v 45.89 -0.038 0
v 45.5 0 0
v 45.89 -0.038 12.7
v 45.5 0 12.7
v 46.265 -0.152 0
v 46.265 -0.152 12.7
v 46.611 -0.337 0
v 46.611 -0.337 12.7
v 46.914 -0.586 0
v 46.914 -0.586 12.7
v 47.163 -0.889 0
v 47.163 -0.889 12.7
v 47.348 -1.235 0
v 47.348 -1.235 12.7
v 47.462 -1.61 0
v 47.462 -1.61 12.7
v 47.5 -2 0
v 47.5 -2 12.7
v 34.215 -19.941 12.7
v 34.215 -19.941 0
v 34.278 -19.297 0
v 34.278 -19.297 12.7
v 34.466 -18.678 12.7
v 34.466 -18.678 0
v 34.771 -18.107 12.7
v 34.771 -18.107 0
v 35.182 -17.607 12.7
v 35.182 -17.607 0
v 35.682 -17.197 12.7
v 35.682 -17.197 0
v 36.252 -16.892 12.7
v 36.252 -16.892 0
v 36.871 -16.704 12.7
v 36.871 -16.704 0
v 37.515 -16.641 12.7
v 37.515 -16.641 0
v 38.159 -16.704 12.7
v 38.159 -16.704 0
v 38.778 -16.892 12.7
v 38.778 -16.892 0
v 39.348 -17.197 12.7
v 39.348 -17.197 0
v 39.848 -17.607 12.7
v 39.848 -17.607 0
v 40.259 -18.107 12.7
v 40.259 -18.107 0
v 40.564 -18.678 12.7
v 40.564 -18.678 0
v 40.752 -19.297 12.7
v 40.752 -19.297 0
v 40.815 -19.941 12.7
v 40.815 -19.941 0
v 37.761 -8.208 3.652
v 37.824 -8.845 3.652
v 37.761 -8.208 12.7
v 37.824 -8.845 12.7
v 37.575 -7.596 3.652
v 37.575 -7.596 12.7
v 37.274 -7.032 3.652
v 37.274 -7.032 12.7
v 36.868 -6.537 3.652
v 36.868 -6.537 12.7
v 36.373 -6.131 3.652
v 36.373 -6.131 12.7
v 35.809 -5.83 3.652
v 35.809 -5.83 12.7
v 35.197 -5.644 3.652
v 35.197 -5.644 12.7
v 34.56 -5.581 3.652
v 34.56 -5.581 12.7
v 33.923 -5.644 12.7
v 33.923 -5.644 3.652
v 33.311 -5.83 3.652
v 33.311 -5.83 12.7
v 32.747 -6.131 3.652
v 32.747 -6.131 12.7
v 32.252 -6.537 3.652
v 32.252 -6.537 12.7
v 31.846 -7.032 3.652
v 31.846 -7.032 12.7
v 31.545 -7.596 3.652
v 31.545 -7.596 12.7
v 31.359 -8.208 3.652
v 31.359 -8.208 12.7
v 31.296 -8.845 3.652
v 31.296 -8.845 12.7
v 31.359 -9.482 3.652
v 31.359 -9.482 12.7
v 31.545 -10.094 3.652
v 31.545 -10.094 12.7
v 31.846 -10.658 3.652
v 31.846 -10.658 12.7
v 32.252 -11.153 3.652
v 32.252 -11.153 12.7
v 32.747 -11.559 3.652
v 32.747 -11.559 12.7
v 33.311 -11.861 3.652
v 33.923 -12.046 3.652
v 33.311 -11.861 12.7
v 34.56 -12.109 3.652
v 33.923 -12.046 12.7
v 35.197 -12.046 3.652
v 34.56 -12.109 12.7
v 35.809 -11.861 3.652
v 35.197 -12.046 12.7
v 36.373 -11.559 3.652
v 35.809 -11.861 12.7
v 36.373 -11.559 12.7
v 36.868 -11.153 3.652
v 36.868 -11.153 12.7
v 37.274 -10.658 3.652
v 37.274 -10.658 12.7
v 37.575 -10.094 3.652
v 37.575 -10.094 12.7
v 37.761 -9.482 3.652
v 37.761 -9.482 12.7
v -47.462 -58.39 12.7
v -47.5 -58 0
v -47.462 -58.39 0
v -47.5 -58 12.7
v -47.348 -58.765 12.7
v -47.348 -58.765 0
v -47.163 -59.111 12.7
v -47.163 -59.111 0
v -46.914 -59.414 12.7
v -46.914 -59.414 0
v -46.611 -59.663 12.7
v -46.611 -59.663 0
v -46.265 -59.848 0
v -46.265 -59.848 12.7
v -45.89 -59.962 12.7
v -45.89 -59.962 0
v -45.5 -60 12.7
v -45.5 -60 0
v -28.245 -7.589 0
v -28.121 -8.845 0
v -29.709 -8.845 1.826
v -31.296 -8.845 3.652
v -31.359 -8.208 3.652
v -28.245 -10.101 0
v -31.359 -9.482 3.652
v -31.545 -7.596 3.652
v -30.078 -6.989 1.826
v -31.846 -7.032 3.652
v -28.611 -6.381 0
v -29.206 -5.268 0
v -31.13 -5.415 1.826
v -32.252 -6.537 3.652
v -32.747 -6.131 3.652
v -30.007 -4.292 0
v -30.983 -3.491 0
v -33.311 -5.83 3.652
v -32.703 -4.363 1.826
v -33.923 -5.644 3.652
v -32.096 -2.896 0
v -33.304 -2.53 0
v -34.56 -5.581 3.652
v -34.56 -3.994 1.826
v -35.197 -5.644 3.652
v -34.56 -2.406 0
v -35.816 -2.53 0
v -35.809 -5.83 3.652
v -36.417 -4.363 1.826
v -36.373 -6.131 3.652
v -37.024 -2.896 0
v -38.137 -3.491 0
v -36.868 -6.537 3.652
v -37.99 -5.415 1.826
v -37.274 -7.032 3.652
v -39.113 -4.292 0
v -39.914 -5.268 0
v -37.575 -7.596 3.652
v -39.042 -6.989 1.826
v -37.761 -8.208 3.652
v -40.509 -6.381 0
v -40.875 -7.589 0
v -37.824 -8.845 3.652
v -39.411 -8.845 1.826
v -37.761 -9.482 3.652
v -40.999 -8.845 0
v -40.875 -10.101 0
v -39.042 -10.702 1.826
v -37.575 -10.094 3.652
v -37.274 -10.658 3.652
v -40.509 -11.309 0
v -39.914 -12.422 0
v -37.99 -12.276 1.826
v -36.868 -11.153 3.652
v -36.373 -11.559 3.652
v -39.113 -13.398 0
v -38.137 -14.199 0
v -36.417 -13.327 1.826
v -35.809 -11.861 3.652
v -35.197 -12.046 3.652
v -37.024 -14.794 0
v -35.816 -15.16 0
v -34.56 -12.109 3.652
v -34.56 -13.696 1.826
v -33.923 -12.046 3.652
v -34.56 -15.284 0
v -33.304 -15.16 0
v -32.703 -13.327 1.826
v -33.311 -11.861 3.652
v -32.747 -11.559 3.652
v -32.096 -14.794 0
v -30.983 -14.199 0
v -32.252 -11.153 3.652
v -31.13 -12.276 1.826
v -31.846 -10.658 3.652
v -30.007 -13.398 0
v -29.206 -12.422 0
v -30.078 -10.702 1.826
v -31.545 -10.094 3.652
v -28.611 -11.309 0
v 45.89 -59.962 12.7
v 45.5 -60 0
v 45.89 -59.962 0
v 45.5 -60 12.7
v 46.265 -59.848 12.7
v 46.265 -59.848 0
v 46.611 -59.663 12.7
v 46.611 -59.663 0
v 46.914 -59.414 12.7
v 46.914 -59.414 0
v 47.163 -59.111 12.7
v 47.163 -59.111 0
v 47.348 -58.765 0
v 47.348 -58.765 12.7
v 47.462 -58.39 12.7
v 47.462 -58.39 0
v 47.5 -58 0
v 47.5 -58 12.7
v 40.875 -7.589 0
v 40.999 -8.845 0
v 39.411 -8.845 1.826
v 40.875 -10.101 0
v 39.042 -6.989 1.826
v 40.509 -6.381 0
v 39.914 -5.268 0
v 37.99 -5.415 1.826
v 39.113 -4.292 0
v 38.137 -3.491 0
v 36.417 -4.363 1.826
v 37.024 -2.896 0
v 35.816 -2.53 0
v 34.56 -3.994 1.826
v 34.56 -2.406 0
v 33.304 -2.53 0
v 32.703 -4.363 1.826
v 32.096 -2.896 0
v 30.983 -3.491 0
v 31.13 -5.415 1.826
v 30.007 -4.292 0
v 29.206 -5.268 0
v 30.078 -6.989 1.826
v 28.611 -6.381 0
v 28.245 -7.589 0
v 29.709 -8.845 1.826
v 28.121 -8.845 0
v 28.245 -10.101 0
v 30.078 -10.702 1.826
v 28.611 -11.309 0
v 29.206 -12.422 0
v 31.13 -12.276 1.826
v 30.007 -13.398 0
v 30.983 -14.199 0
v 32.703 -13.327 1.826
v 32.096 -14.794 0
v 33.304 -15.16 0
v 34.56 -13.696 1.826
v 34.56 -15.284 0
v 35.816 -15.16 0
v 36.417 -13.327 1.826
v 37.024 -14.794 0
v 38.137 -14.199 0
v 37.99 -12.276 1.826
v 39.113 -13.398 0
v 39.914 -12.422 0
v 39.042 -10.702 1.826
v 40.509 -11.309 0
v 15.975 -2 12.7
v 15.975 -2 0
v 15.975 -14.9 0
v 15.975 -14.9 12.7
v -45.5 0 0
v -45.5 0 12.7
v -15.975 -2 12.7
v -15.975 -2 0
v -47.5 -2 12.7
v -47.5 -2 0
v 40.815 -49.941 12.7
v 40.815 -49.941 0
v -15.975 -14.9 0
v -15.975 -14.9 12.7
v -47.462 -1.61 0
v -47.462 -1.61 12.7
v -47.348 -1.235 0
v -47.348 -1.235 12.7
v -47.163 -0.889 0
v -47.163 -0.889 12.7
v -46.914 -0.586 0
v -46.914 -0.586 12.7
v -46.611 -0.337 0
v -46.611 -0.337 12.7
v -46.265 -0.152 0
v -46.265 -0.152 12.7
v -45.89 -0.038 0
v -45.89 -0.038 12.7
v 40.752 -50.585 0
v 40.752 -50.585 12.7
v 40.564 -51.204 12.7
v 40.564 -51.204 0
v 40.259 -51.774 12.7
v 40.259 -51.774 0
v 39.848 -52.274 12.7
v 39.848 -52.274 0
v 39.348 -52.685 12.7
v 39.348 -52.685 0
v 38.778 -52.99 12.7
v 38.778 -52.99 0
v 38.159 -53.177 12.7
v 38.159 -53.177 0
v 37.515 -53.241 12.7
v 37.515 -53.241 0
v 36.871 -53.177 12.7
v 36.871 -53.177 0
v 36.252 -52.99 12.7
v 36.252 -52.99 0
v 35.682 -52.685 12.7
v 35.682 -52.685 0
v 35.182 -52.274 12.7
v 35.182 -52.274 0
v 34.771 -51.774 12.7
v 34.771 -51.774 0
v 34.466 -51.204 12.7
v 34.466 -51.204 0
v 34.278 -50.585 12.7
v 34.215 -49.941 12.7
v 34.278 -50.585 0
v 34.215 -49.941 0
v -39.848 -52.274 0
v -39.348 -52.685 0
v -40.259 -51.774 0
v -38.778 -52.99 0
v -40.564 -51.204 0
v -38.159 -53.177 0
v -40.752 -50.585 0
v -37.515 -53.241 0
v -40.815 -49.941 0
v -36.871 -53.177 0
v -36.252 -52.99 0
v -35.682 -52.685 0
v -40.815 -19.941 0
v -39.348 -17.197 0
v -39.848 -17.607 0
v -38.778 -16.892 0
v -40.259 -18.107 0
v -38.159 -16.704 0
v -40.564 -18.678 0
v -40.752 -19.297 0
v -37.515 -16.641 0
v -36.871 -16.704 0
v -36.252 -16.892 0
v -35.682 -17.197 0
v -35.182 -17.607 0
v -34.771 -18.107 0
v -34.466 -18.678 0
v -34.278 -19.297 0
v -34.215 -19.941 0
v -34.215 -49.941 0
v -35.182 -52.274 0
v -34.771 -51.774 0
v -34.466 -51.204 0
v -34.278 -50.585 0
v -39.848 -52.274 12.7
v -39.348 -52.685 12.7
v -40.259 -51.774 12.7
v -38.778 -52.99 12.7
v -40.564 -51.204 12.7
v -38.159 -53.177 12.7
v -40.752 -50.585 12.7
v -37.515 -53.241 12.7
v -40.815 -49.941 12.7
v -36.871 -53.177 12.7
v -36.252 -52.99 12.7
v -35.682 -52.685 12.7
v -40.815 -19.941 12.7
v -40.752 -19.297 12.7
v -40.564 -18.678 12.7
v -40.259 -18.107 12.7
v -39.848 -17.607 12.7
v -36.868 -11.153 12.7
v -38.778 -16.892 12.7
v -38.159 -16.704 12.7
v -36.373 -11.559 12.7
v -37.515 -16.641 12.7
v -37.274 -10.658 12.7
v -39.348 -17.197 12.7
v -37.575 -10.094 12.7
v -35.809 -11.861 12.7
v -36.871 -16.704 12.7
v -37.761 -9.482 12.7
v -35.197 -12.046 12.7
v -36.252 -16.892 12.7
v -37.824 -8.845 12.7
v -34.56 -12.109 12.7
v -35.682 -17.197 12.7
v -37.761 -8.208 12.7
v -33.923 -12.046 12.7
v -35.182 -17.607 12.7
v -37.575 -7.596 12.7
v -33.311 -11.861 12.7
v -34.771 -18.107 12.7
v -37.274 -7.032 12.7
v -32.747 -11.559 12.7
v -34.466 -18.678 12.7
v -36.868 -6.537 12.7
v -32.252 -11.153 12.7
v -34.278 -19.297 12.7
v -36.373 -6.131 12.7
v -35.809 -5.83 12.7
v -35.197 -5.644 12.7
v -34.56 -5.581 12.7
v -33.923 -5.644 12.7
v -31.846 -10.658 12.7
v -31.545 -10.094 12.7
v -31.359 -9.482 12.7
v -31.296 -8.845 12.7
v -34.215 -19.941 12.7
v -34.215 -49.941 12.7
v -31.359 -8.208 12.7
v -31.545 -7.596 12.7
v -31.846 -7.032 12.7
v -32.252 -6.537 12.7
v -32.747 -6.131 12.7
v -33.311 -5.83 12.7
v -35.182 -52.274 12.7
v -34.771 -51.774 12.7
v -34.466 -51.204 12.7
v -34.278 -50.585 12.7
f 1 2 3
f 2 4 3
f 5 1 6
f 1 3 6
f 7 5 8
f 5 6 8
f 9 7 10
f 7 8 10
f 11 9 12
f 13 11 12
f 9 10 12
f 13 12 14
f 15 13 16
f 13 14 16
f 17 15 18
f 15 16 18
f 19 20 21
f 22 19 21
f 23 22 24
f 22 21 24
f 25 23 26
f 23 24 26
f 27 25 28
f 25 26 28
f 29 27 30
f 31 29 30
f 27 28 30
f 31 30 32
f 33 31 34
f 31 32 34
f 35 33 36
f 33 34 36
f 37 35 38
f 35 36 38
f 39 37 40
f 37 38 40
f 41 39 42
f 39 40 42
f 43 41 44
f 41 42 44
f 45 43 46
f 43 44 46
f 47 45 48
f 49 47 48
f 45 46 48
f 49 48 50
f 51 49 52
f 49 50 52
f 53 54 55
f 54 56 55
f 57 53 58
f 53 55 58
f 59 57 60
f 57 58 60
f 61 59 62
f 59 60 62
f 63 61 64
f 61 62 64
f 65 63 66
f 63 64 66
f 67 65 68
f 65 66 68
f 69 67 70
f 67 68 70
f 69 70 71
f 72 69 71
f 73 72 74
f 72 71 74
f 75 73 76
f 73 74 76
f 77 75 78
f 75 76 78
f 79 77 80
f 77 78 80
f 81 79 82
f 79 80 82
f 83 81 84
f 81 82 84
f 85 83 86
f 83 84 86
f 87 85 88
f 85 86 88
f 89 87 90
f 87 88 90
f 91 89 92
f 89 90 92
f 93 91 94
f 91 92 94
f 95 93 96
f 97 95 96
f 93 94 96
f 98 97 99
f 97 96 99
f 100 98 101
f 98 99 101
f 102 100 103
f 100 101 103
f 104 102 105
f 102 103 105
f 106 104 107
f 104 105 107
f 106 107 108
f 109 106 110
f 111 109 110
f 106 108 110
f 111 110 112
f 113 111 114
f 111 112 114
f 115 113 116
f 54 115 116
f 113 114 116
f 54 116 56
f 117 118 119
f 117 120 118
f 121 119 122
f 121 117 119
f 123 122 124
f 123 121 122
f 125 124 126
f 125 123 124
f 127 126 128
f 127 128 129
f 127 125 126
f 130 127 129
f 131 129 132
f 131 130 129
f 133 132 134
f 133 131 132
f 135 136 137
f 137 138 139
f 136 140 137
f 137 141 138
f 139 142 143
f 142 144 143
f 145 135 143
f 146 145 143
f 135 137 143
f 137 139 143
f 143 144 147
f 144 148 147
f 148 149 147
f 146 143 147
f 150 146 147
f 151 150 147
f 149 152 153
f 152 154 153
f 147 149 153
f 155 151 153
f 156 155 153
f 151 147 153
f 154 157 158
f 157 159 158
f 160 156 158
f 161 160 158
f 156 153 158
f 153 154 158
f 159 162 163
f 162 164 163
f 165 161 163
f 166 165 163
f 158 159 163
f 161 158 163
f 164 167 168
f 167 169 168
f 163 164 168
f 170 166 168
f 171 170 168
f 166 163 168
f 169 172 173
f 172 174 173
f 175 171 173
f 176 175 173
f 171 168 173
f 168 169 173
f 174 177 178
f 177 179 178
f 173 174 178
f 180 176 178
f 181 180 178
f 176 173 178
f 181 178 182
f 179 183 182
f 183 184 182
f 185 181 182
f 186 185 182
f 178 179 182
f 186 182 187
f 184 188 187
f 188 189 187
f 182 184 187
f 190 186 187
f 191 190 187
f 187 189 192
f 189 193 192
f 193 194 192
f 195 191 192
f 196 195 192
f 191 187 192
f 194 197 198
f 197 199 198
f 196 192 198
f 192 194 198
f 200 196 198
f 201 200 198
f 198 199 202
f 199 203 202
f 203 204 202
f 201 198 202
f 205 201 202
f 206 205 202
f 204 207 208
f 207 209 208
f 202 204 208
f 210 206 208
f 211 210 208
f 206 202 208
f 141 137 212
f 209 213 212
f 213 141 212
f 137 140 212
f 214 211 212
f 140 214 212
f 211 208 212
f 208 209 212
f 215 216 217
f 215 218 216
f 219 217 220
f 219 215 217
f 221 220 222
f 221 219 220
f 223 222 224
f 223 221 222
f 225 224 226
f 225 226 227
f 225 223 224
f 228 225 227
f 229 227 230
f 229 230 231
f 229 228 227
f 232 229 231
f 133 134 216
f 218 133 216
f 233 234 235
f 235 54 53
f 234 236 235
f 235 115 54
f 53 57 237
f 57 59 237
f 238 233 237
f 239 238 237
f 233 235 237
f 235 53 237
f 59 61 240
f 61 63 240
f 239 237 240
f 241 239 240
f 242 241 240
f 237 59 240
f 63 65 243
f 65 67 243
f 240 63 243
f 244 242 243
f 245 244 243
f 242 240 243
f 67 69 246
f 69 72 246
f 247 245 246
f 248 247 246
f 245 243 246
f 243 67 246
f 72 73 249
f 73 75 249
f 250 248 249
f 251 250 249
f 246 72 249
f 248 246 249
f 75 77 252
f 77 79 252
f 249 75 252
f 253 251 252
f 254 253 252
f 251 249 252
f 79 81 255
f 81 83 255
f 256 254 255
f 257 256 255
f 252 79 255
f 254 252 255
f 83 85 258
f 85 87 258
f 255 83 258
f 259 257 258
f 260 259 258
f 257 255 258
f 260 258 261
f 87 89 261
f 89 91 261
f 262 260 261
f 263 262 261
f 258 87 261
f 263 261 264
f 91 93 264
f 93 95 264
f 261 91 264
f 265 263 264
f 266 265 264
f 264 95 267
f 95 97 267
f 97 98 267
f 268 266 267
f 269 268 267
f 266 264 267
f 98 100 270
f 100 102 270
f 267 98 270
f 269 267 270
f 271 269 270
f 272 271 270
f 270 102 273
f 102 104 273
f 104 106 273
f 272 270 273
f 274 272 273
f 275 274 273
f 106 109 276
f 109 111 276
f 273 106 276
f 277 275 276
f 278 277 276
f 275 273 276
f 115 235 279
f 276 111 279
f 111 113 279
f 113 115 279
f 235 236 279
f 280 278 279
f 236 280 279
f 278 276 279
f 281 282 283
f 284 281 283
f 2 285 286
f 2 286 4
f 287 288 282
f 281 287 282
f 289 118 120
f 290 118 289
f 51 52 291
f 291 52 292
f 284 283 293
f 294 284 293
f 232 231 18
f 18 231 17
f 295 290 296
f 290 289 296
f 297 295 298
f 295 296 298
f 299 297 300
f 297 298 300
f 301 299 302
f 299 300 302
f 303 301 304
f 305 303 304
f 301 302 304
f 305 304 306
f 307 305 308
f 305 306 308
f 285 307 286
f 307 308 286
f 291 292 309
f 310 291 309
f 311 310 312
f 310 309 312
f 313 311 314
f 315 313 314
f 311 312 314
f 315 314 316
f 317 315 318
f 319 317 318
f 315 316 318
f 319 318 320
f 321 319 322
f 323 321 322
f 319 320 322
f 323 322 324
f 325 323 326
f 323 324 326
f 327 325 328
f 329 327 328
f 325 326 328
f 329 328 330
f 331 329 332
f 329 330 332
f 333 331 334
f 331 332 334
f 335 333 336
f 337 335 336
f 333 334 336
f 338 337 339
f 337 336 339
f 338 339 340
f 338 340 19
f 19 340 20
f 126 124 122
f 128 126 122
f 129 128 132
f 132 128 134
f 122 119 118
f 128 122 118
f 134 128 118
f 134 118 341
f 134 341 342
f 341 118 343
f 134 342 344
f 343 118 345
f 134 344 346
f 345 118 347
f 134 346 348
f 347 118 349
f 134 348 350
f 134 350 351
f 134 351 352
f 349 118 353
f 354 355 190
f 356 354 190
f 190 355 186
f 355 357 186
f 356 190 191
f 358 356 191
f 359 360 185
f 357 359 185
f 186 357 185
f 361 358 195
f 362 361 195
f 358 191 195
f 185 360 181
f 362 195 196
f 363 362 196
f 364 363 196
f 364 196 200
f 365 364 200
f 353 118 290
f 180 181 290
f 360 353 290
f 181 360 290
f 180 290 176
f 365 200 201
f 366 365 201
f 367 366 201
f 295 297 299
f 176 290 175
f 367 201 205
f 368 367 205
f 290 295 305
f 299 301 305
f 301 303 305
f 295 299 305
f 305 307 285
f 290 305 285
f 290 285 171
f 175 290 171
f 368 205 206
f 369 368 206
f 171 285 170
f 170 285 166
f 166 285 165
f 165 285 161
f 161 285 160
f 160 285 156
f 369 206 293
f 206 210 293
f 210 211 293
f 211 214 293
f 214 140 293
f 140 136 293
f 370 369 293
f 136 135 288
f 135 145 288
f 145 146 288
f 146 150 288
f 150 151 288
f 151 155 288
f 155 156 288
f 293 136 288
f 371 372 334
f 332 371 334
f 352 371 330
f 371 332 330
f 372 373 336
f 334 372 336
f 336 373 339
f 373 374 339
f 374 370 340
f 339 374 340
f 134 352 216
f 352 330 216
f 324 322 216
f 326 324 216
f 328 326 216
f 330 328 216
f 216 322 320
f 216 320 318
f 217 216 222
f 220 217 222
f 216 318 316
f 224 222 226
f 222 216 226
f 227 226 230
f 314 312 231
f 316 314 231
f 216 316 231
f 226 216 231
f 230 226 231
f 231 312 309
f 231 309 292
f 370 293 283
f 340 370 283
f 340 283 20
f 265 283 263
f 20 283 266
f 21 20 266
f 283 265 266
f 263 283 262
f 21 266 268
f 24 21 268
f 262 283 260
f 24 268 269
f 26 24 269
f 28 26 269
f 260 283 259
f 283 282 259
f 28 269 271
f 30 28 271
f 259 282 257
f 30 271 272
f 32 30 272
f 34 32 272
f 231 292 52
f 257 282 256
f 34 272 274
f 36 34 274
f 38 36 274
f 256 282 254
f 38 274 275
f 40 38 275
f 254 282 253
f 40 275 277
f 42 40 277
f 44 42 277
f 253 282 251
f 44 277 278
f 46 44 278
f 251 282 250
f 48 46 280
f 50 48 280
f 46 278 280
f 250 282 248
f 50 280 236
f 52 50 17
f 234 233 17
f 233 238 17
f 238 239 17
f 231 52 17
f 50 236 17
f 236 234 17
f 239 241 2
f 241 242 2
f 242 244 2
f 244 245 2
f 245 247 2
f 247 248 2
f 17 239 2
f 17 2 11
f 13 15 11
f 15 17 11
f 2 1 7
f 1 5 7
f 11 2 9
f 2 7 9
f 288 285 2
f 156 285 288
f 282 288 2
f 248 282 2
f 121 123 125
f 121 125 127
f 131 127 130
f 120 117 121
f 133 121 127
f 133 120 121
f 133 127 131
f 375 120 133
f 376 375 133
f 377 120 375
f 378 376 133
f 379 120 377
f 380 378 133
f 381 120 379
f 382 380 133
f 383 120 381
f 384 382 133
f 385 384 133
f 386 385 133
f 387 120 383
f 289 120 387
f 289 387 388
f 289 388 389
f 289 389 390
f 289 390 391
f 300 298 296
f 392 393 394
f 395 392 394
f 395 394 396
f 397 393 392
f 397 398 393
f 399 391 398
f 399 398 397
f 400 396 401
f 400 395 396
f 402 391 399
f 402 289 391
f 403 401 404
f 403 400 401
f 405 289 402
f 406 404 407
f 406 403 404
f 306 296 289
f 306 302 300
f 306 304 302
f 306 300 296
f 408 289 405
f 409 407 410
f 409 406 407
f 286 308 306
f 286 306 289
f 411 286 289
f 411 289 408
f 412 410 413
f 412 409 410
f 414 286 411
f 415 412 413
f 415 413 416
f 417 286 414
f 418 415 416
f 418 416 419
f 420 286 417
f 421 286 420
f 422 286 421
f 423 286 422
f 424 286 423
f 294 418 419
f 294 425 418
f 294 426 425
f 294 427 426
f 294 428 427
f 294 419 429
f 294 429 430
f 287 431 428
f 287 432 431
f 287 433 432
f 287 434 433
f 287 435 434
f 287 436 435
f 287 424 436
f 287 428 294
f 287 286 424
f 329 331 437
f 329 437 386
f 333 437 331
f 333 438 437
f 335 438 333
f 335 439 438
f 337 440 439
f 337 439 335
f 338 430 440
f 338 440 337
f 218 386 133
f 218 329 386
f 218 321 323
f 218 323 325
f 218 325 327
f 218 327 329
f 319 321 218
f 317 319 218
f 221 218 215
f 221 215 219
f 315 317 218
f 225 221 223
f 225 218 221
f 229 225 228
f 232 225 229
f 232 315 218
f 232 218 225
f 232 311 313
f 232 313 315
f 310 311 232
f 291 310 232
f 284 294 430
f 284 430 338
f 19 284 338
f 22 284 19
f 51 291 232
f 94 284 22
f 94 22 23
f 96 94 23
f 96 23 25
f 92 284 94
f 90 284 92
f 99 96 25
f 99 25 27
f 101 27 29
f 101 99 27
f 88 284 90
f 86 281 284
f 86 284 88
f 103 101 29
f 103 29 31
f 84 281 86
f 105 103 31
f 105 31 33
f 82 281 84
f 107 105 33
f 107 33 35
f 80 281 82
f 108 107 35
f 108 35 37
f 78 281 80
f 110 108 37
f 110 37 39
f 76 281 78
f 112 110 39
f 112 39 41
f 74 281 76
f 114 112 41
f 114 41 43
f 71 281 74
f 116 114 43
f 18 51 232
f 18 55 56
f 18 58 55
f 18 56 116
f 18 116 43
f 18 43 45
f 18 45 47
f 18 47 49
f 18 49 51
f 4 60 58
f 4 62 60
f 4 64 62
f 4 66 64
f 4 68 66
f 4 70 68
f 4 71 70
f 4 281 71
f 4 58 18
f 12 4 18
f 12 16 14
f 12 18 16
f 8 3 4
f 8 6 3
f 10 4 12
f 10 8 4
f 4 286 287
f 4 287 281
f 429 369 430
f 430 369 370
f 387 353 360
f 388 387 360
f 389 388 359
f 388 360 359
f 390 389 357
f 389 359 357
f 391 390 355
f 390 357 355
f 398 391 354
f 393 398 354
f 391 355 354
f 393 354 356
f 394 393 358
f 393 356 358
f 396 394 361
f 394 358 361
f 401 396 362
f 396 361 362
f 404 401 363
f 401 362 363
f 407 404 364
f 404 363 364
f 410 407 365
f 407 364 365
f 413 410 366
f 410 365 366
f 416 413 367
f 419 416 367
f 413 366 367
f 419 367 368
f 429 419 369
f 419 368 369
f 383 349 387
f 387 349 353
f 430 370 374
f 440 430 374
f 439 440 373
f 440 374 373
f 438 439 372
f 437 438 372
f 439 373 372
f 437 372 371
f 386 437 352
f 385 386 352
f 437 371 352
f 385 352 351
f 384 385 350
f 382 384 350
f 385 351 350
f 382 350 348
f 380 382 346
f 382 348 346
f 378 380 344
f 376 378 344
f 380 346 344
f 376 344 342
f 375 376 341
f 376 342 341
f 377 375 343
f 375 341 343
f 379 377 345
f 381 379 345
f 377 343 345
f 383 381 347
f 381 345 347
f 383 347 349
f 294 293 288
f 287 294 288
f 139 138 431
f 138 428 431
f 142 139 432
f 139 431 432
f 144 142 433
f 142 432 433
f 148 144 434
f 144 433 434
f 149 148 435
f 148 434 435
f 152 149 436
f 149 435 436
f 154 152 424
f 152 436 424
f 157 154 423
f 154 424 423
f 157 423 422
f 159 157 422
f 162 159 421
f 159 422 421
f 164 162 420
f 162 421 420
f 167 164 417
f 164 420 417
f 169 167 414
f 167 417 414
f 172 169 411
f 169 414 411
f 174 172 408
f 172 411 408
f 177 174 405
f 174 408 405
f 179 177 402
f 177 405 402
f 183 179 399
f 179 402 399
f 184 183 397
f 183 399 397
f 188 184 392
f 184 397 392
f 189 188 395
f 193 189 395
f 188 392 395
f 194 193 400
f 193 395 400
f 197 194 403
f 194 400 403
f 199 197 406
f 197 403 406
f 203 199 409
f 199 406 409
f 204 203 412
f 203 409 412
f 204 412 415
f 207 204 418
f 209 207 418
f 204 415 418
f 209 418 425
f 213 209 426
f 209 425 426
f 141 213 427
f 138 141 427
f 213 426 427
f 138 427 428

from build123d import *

# Parameters (mm, degrees)
SKETCH1_W                                        = 95
SKETCH1_H                                        = 60
BOSS_EXTRUDE1_DEPTH                              = 12.7
CSK_FOR_1_4_FLAT_HEAD_MACHINE_SCREW2_D           = 6.5278
CSK_FOR_1_4_FLAT_HEAD_MACHINE_SCREW2_CSINK_D     = 12.8778
CSK_FOR_1_4_FLAT_HEAD_MACHINE_SCREW2_CSINK_ANGLE = 82
FILLET1_R                                        = 2
FILLET2_R                                        = 2
CUT_EXTRUDE1_DEPTH                               = 78.572804513


with BuildPart() as part:
    # Sketch1 → Boss-Extrude1 (new body)
    with BuildSketch(Plane.XY):
        with Locations((0, -30)):
            Rectangle(SKETCH1_W, SKETCH1_H)
        Polygon((0, -2), (15.975, -2), (15.975, -14.9), (-15.975, -14.9), (-15.975, -2), align=None, mode=Mode.SUBTRACT)
    extrude(amount=BOSS_EXTRUDE1_DEPTH)

    # CSK for 1/4 Flat Head Machine Screw2 (through all)
    with Locations(Plane(origin=(0, 0, 0), x_dir=(-1, 0, 0), z_dir=(0, 0, -1))):
        with Locations((-34.56, -8.845086615), (34.56, -8.845086615)):
            CounterSinkHole(CSK_FOR_1_4_FLAT_HEAD_MACHINE_SCREW2_D / 2, CSK_FOR_1_4_FLAT_HEAD_MACHINE_SCREW2_CSINK_D / 2, counter_sink_angle=CSK_FOR_1_4_FLAT_HEAD_MACHINE_SCREW2_CSINK_ANGLE)

    # Fillet1
    fillet1_edges = [part.edges().sort_by_distance(p)[0] for p in [
        (-47.5, 0, 6.35),
        (-47.5, -60, 6.35),
    ]]
    fillet(fillet1_edges, radius=FILLET1_R)

    # Fillet2
    fillet2_edges = [part.edges().sort_by_distance(p)[0] for p in [
        (47.5, 0, 6.35),
        (47.5, -60, 6.35),
    ]]
    fillet(fillet2_edges, radius=FILLET2_R)

    # Sketch9 → Cut-Extrude1 (cut, through all)
    with BuildSketch(Plane(origin=(0, 0, 0), x_dir=(-1, 0, 0), z_dir=(0, 0, -1))):
        with BuildLine():
            Line((-34.215, -49.94085979), (-34.215, -19.94085979))
            ThreePointArc((-34.215, -19.94085979), (-37.515, -16.64085979), (-40.815, -19.94085979))
            Line((-40.815, -19.94085979), (-40.815, -49.94085979))
            ThreePointArc((-40.815, -49.94085979), (-37.515, -53.24085979), (-34.215, -49.94085979))
        make_face()
        with BuildLine():
            Line((40.815, -49.94085979), (40.815, -19.94085979))
            ThreePointArc((40.815, -19.94085979), (37.515, -16.64085979), (34.215, -19.94085979))
            Line((34.215, -19.94085979), (34.215, -49.94085979))
            ThreePointArc((34.215, -49.94085979), (37.515, -53.24085979), (40.815, -49.94085979))
        make_face()
    extrude(amount=-CUT_EXTRUDE1_DEPTH, mode=Mode.SUBTRACT)


solid = part.part
